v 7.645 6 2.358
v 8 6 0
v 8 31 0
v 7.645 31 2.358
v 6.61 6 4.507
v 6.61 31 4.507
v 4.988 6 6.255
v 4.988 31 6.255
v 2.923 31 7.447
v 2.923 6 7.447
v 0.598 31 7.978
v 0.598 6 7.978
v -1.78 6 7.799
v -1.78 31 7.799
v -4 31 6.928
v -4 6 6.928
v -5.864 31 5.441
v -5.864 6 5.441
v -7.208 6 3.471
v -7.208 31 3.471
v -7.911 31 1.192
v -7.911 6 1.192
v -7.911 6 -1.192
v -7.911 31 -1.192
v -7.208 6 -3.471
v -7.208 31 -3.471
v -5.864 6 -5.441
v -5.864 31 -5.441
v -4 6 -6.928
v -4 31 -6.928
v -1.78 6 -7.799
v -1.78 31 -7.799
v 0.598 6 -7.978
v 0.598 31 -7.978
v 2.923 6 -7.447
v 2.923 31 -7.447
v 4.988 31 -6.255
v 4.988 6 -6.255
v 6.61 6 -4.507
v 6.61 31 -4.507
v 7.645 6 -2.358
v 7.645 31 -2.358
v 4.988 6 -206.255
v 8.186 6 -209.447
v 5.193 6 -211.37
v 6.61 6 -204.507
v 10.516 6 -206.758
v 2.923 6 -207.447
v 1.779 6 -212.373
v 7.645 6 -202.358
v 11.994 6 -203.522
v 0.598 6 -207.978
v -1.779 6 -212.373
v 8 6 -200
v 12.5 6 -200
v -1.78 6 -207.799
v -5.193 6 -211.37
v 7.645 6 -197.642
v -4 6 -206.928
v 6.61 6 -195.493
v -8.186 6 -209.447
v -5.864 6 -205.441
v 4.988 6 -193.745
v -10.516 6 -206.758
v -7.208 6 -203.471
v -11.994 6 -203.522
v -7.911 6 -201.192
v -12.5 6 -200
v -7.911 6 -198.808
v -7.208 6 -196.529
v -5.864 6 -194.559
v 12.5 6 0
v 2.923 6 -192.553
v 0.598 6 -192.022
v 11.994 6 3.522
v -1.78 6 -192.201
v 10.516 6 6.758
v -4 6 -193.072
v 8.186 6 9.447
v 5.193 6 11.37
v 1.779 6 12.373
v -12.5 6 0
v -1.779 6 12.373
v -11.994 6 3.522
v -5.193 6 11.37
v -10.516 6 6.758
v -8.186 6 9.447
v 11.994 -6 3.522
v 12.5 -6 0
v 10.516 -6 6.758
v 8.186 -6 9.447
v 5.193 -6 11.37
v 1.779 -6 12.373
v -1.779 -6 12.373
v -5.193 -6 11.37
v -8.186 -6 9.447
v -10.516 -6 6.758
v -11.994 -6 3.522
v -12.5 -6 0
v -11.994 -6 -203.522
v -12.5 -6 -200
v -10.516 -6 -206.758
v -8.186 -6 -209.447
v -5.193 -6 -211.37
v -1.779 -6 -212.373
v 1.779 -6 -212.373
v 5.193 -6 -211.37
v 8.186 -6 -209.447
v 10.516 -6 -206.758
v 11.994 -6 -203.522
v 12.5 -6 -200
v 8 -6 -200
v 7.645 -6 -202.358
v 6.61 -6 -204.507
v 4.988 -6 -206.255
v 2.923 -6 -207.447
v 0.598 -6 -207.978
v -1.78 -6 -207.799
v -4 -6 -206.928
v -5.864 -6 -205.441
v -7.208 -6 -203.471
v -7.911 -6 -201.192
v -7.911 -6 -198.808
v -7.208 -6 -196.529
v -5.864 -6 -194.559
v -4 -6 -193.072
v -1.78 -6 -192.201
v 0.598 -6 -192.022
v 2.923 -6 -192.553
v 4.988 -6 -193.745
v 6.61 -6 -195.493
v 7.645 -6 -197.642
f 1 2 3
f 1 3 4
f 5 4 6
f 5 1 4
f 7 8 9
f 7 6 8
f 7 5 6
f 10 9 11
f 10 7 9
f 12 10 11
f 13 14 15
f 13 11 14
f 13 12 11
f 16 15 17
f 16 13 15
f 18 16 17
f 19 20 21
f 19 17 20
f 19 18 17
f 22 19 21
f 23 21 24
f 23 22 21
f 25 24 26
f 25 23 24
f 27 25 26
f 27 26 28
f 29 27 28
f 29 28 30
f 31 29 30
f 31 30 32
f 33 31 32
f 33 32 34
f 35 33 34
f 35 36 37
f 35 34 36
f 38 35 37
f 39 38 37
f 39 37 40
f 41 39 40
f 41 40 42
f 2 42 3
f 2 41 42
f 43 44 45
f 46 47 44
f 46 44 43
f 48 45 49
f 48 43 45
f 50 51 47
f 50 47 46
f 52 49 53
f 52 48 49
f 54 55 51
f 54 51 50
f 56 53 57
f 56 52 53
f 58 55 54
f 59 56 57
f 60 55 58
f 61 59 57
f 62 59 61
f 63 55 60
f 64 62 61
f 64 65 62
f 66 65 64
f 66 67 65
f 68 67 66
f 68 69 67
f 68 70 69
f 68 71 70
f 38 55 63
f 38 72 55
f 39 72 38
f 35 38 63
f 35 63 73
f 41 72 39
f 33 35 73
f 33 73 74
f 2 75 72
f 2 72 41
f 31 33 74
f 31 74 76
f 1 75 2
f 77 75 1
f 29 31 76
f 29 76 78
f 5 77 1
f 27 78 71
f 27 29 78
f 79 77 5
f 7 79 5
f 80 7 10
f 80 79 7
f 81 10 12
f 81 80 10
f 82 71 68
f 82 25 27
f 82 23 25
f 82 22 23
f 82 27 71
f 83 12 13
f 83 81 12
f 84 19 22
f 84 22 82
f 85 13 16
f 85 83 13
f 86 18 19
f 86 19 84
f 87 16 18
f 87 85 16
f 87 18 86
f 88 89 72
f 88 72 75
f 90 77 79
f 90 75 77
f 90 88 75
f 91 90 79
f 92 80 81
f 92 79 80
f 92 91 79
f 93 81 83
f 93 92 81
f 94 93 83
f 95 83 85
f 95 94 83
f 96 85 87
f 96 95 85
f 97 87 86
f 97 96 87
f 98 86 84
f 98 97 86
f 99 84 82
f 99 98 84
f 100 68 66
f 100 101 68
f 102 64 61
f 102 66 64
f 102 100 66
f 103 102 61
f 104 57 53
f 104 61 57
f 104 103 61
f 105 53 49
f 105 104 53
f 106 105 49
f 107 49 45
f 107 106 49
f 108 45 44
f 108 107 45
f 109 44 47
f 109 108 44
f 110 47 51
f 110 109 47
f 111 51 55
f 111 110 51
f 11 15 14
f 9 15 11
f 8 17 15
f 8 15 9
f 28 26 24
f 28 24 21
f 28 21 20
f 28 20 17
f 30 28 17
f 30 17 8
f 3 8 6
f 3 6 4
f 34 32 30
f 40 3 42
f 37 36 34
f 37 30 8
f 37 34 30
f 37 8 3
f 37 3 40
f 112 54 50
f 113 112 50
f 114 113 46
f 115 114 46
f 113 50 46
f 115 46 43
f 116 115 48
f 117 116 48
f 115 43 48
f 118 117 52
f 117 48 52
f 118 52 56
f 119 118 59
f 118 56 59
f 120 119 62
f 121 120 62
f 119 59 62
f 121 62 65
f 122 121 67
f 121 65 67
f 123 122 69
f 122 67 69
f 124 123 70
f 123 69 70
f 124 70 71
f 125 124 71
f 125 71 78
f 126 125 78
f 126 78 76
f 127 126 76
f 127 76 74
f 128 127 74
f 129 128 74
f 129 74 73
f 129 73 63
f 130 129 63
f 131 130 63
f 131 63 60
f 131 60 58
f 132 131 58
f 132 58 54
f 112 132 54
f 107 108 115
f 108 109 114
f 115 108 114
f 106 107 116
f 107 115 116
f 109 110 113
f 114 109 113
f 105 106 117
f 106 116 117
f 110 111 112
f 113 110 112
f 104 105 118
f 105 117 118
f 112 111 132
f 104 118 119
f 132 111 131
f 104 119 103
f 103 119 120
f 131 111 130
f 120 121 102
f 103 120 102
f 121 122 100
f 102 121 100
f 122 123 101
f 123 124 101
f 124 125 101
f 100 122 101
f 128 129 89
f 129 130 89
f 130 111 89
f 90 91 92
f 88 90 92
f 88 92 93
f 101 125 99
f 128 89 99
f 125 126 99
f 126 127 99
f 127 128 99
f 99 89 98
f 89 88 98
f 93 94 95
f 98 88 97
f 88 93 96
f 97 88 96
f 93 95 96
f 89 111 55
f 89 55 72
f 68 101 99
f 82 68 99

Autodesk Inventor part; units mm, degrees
ref_plane "YZ Plane" through (0, 0, 0) normal (1, 0, 0) x (0, 1, 0)
ref_plane "XZ Plane" through (0, 0, 0) normal (0, 1, 0) x (-1, 0, 0)
ref_plane "XY Plane" through (0, 0, 0) normal (0, 0, 1) x (1, 0, 0)
sketch "Sketch1" plane through (0, 0, 0) normal (0, 1, 0) x (-1, 0, 0)
  line L0 (0, 0) -> (0, -200) construction
  arc A0 (12.5, 0) -> (-12.5, 0) centre (0, 0) ccw
  arc A1 (-12.5, -200) -> (12.5, -200) centre (0, -200) ccw
  line L1 (12.5, -200) -> (12.5, 0)
  line L2 (-12.5, -200) -> (-12.5, 0)
  dimension "d0" = 200
  dimension "d3" = 25
  dimension "d4" = 25
extrude "Extrusion1" add sketch "Sketch1" along normal mid plane 12
sketch "Sketch2" plane through (0, 6, 0) normal (0, 1, 0) x (1, 0, 0)
  circle A0 centre (0, 0) radius 8
  dimension "d7" = 16
extrude "Extrusion2" add sketch "Sketch2" along normal blind 25
sketch "Sketch3" plane through (0, 6, 0) normal (0, 1, 0) x (1, 0, 0)
  circle A0 centre (0, 200) radius 8
  point P0 (0, 0)
  dimension "d10" = 16
extrude "Extrusion3" cut sketch "Sketch3" against normal blind 12
properties part number "manivela"
